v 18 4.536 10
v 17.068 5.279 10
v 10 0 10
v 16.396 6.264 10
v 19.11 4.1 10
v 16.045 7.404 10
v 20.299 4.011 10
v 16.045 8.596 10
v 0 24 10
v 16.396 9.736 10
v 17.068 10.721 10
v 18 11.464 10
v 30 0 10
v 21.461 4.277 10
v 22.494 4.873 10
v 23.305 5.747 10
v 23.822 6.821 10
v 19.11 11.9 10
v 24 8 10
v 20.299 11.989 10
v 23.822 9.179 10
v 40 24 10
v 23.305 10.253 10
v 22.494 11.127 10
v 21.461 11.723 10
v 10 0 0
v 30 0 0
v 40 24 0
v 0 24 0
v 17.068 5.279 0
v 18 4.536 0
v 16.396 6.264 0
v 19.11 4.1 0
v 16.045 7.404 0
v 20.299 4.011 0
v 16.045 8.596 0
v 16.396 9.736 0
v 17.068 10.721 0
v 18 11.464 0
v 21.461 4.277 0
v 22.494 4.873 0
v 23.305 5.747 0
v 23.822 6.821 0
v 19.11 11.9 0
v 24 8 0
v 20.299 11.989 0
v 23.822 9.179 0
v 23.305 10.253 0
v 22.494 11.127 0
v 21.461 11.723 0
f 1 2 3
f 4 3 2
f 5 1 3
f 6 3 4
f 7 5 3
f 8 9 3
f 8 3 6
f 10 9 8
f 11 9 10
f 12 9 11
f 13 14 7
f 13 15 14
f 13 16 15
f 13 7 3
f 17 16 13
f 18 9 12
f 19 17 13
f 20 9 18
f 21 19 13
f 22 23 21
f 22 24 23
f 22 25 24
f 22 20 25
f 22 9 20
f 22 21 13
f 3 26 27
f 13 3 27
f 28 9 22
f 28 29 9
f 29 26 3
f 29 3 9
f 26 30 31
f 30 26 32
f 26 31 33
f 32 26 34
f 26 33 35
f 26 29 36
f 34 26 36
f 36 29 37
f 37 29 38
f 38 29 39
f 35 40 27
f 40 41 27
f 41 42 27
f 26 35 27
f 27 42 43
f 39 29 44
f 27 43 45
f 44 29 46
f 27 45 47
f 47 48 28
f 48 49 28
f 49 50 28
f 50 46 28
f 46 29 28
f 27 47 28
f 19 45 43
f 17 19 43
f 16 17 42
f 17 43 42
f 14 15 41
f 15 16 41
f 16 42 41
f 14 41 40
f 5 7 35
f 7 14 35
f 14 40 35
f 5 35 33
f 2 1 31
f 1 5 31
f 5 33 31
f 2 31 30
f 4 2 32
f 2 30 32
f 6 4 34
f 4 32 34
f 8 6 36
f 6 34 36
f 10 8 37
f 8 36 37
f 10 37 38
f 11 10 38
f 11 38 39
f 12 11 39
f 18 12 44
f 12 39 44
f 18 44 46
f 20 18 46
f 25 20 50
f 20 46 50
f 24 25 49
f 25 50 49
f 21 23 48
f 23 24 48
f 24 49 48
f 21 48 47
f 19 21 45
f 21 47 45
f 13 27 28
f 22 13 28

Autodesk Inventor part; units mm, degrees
ref_plane "YZ Plane" through (0, 0, 0) normal (1, 0, 0) x (0, 1, 0)
ref_plane "XZ Plane" through (0, 0, 0) normal (0, 1, 0) x (-1, 0, 0)
ref_plane "XY Plane" through (0, 0, 0) normal (0, 0, 1) x (1, 0, 0)
sketch "Эскиз1" plane through (0, 0, 0) normal (0, 0, 1) x (1, 0, 0)
  line L0 (10, 0) -> (30, 0)
  line L1 (30, 0) -> (40, 24)
  line L2 (10, 0) -> (0, 24)
  circle A0 centre (20, 8) radius 4
  line L3 (0, 24) -> (40, 24)
  point P0 (0, 0)
  dimension "d0" = 24
  dimension "d1" = 40
  dimension "d3" = 20
  dimension "d6" = 8
extrude "Выдавливание1" add sketch "Эскиз1" along normal blind 10
properties part number "N2"
